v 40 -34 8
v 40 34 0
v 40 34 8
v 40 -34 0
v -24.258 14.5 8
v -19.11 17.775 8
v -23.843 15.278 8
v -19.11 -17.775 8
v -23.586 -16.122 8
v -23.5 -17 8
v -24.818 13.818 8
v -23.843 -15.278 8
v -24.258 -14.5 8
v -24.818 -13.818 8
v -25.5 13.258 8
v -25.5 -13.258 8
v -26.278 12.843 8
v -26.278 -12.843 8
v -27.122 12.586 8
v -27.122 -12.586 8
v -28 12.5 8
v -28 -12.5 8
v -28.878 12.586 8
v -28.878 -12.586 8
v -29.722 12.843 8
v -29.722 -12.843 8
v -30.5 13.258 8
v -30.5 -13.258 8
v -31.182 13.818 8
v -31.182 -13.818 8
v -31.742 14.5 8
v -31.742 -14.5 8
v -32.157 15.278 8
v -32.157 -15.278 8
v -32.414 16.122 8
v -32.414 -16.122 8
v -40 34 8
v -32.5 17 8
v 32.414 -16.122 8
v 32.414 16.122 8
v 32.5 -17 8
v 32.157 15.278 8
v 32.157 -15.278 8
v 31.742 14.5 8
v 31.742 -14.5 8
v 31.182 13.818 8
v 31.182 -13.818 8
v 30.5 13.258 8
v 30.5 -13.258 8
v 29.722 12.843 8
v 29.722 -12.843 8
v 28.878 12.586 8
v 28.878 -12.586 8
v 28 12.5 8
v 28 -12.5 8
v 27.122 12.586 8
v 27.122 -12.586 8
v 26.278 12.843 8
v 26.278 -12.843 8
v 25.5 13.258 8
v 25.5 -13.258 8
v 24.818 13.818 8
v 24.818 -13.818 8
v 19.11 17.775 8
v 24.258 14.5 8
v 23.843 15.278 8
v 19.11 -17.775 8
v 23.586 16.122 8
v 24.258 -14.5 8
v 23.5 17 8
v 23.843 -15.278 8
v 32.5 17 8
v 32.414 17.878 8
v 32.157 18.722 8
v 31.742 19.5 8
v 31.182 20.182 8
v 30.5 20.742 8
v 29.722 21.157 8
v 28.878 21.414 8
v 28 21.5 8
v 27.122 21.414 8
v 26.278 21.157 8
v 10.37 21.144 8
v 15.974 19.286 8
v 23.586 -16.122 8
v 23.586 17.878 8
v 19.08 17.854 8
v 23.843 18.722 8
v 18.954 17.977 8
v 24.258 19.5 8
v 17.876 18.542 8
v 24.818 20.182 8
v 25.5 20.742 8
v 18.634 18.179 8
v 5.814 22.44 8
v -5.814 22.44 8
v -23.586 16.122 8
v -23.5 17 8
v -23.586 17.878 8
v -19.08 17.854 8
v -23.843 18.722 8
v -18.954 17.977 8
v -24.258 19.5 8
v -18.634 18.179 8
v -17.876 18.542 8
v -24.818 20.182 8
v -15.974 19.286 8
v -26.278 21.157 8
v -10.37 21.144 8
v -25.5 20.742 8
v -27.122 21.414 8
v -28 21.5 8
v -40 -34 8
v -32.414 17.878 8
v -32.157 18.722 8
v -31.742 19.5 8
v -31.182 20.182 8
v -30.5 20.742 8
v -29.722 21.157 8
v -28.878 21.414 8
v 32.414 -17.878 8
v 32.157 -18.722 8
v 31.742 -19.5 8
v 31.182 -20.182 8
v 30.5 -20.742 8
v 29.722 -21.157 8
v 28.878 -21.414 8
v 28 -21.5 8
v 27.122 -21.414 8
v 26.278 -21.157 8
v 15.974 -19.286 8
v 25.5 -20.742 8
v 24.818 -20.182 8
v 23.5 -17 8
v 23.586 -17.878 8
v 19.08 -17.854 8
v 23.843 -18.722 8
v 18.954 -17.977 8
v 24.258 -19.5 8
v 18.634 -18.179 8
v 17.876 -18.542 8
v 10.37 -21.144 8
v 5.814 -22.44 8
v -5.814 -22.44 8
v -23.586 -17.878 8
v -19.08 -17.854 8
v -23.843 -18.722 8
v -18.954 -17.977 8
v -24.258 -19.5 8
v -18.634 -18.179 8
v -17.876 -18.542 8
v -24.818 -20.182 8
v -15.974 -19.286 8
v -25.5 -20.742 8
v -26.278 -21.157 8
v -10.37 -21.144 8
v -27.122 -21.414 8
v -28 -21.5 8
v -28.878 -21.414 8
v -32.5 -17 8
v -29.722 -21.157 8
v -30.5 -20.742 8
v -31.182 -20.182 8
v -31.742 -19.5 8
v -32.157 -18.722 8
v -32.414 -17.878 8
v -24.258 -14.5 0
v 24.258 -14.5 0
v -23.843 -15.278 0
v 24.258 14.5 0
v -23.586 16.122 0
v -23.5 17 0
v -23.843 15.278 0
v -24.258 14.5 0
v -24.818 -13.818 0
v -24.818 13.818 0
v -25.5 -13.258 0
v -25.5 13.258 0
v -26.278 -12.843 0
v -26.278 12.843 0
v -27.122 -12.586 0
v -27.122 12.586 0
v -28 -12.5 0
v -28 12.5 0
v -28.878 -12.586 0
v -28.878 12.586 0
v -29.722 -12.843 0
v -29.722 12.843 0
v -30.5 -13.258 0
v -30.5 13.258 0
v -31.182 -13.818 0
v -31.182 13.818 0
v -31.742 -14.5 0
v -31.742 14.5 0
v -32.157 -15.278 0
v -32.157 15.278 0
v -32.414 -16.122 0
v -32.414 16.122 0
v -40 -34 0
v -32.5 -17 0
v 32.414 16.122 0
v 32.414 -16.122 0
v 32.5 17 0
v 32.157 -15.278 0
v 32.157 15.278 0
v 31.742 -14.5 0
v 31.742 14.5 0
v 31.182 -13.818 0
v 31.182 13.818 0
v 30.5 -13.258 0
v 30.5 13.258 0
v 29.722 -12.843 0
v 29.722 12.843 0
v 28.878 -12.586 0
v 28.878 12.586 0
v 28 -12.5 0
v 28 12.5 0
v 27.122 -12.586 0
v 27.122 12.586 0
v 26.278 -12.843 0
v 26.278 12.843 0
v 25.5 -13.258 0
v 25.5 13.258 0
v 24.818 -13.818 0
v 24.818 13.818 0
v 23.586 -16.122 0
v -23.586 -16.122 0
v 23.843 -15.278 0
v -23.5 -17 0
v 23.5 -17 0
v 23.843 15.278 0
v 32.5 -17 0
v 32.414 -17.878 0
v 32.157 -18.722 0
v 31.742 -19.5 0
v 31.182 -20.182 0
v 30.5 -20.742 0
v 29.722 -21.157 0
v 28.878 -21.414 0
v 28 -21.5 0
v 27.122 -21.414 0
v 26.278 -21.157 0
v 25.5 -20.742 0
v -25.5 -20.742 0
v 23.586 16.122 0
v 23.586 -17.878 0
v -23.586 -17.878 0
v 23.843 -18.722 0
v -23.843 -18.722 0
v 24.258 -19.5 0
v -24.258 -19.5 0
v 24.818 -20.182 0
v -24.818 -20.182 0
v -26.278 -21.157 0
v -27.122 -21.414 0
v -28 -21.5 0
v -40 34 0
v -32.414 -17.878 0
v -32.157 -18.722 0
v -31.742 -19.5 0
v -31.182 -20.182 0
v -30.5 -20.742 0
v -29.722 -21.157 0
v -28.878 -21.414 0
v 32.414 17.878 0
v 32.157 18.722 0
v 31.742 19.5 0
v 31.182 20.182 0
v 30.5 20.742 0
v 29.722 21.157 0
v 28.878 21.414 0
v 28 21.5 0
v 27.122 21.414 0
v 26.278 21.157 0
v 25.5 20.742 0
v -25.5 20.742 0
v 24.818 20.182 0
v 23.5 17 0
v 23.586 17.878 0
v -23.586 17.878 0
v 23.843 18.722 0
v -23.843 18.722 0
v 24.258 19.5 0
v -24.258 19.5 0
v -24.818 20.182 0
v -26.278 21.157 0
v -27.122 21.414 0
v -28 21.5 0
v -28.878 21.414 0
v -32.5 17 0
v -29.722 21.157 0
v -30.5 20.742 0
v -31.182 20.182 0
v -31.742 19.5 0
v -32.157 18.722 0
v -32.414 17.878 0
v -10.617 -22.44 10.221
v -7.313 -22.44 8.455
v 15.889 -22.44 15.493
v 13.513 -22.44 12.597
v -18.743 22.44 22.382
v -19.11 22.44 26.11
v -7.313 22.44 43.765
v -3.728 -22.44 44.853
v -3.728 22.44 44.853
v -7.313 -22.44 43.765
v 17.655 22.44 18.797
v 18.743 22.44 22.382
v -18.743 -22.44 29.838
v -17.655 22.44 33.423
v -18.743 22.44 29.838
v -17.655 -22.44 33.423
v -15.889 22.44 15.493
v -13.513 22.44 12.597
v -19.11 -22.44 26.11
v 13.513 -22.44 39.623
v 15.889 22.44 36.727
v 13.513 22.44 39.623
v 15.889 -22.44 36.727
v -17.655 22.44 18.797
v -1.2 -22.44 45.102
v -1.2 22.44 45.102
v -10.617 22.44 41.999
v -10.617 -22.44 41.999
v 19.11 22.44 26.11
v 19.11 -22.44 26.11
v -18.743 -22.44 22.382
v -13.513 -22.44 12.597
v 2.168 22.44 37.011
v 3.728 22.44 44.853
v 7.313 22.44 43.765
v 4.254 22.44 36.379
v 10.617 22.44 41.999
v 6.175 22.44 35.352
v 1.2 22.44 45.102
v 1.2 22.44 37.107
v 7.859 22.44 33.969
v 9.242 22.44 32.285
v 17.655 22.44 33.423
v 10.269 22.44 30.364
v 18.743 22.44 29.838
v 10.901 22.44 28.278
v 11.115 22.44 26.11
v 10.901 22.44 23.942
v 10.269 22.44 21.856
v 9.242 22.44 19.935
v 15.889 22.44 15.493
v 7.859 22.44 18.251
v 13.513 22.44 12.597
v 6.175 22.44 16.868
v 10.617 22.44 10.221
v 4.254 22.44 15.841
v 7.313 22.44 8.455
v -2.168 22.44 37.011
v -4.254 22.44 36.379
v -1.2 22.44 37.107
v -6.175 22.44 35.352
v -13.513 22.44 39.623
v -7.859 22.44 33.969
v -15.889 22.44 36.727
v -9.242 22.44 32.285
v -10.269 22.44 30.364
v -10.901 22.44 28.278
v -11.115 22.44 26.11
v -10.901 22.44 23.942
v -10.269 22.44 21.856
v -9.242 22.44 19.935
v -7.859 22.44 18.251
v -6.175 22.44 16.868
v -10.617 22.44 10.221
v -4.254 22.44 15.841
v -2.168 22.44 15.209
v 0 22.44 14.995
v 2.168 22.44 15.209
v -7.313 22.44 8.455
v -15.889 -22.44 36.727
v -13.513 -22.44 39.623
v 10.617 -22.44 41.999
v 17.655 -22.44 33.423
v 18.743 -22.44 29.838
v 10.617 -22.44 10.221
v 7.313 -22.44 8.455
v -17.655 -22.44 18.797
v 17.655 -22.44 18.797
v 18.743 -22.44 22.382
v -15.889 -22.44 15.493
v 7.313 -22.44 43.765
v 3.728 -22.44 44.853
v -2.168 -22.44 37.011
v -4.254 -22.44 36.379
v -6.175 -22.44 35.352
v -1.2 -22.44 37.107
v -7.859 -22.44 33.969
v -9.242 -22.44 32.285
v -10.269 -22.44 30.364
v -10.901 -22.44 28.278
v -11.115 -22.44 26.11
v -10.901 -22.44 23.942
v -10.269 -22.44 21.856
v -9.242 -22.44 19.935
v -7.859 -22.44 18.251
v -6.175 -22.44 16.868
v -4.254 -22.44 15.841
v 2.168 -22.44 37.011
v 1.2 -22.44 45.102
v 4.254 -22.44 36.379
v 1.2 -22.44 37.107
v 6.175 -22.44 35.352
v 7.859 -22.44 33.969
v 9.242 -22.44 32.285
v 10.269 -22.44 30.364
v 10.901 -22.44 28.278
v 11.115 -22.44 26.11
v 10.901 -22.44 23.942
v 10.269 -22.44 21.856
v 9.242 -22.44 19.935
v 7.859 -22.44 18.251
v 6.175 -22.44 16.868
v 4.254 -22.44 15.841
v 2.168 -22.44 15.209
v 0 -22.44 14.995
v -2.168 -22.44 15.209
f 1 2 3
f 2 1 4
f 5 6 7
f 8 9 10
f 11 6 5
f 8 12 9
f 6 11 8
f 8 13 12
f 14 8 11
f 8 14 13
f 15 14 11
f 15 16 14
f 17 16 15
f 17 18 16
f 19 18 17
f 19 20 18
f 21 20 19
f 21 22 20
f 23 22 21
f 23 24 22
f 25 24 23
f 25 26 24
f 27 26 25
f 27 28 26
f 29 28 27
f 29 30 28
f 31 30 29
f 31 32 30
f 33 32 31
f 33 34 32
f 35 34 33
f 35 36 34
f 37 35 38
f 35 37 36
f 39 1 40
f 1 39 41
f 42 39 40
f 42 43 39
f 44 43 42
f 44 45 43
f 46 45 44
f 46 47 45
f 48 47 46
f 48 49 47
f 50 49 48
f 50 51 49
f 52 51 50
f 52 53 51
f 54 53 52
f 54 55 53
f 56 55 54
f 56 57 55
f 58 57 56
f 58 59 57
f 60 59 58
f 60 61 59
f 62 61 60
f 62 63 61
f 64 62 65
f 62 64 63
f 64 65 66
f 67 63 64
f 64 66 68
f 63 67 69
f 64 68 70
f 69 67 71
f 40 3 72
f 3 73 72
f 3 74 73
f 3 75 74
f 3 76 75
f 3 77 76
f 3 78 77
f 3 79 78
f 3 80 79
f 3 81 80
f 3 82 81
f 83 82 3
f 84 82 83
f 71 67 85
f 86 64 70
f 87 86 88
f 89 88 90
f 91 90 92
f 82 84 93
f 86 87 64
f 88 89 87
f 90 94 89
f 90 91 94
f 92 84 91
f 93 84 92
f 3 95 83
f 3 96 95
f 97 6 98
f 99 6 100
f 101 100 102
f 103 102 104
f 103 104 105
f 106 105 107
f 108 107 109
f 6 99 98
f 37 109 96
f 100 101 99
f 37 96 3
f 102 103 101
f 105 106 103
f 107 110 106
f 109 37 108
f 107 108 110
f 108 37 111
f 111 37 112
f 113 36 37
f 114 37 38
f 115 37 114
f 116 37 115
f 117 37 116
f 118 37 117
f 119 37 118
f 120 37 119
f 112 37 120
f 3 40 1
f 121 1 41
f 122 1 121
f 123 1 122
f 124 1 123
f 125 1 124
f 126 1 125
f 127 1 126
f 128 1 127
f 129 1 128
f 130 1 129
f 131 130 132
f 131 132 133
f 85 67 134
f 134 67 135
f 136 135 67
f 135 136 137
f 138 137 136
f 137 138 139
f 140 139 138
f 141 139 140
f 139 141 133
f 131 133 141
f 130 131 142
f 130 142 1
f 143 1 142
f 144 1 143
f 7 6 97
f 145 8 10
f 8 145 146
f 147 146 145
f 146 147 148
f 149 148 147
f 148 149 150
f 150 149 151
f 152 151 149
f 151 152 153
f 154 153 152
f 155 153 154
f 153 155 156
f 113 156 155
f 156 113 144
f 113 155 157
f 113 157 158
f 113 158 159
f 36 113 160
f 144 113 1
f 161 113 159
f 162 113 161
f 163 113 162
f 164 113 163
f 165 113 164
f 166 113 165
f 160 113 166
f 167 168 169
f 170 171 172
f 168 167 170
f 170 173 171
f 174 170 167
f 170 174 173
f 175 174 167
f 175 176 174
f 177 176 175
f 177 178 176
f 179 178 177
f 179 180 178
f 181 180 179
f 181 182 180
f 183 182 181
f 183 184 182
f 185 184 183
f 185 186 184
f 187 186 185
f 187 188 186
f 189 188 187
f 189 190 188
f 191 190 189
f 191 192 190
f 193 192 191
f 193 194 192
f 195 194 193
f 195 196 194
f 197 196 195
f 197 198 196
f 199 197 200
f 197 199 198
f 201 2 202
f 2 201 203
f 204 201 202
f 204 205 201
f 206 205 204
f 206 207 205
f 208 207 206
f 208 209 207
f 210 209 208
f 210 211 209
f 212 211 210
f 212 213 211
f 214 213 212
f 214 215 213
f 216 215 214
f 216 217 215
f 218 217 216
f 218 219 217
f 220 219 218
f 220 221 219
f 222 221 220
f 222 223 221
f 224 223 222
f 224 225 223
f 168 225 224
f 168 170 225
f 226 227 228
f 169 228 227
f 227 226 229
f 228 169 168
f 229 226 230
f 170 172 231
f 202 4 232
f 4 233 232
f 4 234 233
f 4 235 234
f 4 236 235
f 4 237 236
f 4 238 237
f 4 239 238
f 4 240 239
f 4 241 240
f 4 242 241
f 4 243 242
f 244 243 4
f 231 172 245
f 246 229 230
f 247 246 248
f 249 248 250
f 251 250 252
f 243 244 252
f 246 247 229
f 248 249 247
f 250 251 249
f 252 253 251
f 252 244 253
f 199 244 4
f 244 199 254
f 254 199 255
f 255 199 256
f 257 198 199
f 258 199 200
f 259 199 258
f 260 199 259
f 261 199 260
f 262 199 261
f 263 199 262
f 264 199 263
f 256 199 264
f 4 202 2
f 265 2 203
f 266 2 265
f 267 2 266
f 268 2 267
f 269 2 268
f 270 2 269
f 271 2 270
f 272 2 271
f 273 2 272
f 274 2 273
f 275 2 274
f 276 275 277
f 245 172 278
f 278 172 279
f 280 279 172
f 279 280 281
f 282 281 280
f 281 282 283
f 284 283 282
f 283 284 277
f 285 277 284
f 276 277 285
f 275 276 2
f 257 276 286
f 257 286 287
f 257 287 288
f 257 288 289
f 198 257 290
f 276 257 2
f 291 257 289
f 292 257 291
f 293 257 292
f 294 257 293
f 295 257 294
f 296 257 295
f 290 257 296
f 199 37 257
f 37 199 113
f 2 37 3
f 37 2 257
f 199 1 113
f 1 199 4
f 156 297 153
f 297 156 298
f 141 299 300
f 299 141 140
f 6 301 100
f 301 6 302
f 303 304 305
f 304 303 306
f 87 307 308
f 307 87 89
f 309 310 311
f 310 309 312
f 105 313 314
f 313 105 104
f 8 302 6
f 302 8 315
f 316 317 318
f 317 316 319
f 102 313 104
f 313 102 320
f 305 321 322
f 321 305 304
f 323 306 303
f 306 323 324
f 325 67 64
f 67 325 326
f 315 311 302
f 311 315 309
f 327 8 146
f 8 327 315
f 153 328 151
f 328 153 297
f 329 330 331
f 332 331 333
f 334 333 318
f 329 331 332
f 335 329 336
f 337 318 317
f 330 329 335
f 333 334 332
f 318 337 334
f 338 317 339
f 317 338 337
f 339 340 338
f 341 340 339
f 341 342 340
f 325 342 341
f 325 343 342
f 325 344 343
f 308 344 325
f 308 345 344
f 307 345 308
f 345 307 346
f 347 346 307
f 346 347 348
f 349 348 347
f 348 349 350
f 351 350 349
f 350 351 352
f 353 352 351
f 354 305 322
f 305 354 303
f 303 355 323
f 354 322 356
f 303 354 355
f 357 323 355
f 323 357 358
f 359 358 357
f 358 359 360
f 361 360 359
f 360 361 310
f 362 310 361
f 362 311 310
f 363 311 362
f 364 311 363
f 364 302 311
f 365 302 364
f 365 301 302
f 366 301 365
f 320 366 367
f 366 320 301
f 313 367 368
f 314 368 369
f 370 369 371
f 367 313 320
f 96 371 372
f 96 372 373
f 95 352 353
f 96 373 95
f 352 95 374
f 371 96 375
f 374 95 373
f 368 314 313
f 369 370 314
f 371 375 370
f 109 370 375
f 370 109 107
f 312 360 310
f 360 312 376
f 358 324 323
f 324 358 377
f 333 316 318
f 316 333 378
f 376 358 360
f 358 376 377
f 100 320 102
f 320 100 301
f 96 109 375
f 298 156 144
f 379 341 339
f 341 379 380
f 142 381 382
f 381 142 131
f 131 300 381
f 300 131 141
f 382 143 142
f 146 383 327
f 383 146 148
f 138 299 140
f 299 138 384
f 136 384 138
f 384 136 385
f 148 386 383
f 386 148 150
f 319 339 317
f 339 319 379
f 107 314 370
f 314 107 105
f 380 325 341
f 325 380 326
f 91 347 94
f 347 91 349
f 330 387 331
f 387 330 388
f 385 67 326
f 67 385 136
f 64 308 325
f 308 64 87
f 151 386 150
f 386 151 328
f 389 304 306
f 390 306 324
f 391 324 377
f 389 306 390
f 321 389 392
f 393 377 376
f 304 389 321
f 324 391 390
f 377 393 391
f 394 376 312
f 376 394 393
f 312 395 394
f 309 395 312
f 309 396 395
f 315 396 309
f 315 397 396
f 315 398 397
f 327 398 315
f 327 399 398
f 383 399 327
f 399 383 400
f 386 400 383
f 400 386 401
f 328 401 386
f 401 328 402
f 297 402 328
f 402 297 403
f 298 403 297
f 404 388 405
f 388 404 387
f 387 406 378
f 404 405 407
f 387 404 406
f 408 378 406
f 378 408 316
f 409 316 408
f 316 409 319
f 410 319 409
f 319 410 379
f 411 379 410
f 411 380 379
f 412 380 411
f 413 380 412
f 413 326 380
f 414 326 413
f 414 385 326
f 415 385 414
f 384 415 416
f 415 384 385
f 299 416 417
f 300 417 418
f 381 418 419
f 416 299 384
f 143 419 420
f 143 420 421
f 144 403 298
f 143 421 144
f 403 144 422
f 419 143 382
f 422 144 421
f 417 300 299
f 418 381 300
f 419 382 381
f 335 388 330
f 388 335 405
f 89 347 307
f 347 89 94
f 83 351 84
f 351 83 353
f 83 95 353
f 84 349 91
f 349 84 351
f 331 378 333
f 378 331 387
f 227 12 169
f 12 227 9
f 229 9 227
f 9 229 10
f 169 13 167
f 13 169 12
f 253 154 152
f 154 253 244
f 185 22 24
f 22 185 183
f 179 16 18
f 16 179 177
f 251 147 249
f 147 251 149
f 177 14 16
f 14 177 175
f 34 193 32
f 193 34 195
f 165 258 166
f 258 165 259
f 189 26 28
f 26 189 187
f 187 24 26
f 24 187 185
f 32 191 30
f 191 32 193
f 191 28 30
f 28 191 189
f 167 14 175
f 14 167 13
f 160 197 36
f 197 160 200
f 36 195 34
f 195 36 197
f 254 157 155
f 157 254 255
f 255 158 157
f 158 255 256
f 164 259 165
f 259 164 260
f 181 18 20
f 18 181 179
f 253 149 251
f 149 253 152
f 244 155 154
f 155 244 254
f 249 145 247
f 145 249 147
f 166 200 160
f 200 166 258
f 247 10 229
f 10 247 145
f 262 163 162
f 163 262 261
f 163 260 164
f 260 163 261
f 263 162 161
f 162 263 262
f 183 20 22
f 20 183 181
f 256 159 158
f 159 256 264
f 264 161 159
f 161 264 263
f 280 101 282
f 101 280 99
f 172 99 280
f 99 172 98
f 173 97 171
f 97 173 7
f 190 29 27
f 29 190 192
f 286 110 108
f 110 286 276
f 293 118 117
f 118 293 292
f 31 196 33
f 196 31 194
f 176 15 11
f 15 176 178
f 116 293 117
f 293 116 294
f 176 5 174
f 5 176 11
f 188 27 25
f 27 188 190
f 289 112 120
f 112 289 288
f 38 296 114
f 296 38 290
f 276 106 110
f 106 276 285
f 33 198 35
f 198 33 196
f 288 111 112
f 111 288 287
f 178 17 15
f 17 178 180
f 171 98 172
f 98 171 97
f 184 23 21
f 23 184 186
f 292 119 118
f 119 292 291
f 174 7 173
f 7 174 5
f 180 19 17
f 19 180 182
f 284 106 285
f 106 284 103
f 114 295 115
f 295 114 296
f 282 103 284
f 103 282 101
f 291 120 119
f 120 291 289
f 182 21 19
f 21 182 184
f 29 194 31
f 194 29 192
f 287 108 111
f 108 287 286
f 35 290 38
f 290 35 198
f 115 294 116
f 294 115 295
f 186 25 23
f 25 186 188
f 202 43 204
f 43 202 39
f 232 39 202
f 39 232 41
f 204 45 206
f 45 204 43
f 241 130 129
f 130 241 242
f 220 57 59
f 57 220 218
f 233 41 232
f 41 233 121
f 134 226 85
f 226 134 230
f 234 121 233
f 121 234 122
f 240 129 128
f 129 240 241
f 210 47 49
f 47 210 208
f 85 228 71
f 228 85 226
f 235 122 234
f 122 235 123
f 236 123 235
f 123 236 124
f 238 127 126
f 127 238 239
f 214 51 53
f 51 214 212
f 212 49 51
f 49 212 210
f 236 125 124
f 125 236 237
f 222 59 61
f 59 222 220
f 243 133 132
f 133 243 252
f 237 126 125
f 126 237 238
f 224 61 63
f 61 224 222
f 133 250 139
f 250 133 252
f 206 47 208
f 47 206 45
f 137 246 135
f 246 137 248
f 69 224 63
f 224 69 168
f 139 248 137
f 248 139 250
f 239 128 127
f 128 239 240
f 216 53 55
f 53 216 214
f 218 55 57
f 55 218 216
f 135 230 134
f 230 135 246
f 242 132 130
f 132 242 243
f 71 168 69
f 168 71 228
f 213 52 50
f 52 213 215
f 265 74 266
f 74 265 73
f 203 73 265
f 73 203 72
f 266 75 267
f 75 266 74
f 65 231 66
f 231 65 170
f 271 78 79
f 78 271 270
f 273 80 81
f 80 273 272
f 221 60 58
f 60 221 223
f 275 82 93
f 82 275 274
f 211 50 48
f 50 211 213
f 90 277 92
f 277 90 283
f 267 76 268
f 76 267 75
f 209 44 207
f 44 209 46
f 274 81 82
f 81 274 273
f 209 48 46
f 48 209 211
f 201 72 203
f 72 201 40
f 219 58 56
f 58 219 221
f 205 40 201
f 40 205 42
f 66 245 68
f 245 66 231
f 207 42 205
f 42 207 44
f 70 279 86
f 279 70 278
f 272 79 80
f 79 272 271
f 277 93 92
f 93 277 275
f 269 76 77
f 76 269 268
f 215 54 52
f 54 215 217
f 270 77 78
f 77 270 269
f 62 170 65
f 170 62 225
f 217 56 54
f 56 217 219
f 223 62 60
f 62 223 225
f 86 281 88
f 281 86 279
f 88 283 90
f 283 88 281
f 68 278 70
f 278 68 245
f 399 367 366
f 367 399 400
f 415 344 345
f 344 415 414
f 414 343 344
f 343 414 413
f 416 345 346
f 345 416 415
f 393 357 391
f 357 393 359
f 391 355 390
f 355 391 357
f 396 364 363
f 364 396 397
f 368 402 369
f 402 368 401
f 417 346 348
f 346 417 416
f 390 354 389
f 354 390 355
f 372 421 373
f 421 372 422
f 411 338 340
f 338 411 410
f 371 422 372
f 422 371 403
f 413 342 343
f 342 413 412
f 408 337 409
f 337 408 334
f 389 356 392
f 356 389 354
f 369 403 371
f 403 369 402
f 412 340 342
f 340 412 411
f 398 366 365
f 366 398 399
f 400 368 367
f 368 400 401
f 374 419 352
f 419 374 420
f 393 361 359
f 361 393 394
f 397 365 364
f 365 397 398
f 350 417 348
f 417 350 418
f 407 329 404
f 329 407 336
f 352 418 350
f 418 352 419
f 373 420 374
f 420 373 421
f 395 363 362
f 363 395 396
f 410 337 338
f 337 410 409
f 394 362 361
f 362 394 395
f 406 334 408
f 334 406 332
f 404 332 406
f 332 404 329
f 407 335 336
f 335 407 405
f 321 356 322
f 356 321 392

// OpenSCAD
$fn = 32;

// ----------------------------------------------------------------------
// Bearing block: 80 x 68 mm base, 22.23 mm bore at 26.11 mm
// ----------------------------------------------------------------------

// --- parameters (mm) ---
base_w = 80;              // base width
base_d = 68;              // base depth
base_t = 8;               // base thickness
bore_d = 22.23;           // shaft / bearing bore
house_r = 19.11;          // housing outer radius
house_len = 44.88;        // housing length along the shaft
foot_w = 38.22;           // foot width under the housing
foot_len = 34.88;         // foot length along the shaft
axis_z = 26.11;           // bore axis height above the base
holes_d = 9;              // mounting holes
hole_x = 28;              // mounting hole spacing
groove_w = 2.4;           // oil groove width

difference() {
  union() {
    /* base plate with its underside on z = 0 */
    translate([0, 0, base_t / 2]) cube([base_w, base_d, base_t], center = true);
    /* hull foot: a straight web blending into the round housing */
    hull() {
      translate([0, 0, base_t - 0.5]) cube([foot_w, foot_len, 1.6], center = true);
      translate([0, 0, axis_z]) rotate([-90, 0, 0]) cylinder(h = house_len, d = 2 * house_r, center = true);
    }
  }
  /* bore through the housing, 2.5 mm clear on both sides */
  translate([0, 0, axis_z]) rotate([-90, 0, 0]) cylinder(h = house_len + 5, d = bore_d, center = true);
  /* oil groove from the top of the housing into the bore */
  translate([-groove_w / 2, -house_len / 2 - 2.5, axis_z + bore_d * 0.17]) cube([groove_w, house_len + 5, house_r + 5]);
  /* mounting holes through the base plate */
  for (hx = [-28, 28]) {
    for (hy = [-17, 17]) {
      translate([hx, hy, -2.5]) cylinder(h = base_t + 5, d = holes_d);
    }
  }
}
